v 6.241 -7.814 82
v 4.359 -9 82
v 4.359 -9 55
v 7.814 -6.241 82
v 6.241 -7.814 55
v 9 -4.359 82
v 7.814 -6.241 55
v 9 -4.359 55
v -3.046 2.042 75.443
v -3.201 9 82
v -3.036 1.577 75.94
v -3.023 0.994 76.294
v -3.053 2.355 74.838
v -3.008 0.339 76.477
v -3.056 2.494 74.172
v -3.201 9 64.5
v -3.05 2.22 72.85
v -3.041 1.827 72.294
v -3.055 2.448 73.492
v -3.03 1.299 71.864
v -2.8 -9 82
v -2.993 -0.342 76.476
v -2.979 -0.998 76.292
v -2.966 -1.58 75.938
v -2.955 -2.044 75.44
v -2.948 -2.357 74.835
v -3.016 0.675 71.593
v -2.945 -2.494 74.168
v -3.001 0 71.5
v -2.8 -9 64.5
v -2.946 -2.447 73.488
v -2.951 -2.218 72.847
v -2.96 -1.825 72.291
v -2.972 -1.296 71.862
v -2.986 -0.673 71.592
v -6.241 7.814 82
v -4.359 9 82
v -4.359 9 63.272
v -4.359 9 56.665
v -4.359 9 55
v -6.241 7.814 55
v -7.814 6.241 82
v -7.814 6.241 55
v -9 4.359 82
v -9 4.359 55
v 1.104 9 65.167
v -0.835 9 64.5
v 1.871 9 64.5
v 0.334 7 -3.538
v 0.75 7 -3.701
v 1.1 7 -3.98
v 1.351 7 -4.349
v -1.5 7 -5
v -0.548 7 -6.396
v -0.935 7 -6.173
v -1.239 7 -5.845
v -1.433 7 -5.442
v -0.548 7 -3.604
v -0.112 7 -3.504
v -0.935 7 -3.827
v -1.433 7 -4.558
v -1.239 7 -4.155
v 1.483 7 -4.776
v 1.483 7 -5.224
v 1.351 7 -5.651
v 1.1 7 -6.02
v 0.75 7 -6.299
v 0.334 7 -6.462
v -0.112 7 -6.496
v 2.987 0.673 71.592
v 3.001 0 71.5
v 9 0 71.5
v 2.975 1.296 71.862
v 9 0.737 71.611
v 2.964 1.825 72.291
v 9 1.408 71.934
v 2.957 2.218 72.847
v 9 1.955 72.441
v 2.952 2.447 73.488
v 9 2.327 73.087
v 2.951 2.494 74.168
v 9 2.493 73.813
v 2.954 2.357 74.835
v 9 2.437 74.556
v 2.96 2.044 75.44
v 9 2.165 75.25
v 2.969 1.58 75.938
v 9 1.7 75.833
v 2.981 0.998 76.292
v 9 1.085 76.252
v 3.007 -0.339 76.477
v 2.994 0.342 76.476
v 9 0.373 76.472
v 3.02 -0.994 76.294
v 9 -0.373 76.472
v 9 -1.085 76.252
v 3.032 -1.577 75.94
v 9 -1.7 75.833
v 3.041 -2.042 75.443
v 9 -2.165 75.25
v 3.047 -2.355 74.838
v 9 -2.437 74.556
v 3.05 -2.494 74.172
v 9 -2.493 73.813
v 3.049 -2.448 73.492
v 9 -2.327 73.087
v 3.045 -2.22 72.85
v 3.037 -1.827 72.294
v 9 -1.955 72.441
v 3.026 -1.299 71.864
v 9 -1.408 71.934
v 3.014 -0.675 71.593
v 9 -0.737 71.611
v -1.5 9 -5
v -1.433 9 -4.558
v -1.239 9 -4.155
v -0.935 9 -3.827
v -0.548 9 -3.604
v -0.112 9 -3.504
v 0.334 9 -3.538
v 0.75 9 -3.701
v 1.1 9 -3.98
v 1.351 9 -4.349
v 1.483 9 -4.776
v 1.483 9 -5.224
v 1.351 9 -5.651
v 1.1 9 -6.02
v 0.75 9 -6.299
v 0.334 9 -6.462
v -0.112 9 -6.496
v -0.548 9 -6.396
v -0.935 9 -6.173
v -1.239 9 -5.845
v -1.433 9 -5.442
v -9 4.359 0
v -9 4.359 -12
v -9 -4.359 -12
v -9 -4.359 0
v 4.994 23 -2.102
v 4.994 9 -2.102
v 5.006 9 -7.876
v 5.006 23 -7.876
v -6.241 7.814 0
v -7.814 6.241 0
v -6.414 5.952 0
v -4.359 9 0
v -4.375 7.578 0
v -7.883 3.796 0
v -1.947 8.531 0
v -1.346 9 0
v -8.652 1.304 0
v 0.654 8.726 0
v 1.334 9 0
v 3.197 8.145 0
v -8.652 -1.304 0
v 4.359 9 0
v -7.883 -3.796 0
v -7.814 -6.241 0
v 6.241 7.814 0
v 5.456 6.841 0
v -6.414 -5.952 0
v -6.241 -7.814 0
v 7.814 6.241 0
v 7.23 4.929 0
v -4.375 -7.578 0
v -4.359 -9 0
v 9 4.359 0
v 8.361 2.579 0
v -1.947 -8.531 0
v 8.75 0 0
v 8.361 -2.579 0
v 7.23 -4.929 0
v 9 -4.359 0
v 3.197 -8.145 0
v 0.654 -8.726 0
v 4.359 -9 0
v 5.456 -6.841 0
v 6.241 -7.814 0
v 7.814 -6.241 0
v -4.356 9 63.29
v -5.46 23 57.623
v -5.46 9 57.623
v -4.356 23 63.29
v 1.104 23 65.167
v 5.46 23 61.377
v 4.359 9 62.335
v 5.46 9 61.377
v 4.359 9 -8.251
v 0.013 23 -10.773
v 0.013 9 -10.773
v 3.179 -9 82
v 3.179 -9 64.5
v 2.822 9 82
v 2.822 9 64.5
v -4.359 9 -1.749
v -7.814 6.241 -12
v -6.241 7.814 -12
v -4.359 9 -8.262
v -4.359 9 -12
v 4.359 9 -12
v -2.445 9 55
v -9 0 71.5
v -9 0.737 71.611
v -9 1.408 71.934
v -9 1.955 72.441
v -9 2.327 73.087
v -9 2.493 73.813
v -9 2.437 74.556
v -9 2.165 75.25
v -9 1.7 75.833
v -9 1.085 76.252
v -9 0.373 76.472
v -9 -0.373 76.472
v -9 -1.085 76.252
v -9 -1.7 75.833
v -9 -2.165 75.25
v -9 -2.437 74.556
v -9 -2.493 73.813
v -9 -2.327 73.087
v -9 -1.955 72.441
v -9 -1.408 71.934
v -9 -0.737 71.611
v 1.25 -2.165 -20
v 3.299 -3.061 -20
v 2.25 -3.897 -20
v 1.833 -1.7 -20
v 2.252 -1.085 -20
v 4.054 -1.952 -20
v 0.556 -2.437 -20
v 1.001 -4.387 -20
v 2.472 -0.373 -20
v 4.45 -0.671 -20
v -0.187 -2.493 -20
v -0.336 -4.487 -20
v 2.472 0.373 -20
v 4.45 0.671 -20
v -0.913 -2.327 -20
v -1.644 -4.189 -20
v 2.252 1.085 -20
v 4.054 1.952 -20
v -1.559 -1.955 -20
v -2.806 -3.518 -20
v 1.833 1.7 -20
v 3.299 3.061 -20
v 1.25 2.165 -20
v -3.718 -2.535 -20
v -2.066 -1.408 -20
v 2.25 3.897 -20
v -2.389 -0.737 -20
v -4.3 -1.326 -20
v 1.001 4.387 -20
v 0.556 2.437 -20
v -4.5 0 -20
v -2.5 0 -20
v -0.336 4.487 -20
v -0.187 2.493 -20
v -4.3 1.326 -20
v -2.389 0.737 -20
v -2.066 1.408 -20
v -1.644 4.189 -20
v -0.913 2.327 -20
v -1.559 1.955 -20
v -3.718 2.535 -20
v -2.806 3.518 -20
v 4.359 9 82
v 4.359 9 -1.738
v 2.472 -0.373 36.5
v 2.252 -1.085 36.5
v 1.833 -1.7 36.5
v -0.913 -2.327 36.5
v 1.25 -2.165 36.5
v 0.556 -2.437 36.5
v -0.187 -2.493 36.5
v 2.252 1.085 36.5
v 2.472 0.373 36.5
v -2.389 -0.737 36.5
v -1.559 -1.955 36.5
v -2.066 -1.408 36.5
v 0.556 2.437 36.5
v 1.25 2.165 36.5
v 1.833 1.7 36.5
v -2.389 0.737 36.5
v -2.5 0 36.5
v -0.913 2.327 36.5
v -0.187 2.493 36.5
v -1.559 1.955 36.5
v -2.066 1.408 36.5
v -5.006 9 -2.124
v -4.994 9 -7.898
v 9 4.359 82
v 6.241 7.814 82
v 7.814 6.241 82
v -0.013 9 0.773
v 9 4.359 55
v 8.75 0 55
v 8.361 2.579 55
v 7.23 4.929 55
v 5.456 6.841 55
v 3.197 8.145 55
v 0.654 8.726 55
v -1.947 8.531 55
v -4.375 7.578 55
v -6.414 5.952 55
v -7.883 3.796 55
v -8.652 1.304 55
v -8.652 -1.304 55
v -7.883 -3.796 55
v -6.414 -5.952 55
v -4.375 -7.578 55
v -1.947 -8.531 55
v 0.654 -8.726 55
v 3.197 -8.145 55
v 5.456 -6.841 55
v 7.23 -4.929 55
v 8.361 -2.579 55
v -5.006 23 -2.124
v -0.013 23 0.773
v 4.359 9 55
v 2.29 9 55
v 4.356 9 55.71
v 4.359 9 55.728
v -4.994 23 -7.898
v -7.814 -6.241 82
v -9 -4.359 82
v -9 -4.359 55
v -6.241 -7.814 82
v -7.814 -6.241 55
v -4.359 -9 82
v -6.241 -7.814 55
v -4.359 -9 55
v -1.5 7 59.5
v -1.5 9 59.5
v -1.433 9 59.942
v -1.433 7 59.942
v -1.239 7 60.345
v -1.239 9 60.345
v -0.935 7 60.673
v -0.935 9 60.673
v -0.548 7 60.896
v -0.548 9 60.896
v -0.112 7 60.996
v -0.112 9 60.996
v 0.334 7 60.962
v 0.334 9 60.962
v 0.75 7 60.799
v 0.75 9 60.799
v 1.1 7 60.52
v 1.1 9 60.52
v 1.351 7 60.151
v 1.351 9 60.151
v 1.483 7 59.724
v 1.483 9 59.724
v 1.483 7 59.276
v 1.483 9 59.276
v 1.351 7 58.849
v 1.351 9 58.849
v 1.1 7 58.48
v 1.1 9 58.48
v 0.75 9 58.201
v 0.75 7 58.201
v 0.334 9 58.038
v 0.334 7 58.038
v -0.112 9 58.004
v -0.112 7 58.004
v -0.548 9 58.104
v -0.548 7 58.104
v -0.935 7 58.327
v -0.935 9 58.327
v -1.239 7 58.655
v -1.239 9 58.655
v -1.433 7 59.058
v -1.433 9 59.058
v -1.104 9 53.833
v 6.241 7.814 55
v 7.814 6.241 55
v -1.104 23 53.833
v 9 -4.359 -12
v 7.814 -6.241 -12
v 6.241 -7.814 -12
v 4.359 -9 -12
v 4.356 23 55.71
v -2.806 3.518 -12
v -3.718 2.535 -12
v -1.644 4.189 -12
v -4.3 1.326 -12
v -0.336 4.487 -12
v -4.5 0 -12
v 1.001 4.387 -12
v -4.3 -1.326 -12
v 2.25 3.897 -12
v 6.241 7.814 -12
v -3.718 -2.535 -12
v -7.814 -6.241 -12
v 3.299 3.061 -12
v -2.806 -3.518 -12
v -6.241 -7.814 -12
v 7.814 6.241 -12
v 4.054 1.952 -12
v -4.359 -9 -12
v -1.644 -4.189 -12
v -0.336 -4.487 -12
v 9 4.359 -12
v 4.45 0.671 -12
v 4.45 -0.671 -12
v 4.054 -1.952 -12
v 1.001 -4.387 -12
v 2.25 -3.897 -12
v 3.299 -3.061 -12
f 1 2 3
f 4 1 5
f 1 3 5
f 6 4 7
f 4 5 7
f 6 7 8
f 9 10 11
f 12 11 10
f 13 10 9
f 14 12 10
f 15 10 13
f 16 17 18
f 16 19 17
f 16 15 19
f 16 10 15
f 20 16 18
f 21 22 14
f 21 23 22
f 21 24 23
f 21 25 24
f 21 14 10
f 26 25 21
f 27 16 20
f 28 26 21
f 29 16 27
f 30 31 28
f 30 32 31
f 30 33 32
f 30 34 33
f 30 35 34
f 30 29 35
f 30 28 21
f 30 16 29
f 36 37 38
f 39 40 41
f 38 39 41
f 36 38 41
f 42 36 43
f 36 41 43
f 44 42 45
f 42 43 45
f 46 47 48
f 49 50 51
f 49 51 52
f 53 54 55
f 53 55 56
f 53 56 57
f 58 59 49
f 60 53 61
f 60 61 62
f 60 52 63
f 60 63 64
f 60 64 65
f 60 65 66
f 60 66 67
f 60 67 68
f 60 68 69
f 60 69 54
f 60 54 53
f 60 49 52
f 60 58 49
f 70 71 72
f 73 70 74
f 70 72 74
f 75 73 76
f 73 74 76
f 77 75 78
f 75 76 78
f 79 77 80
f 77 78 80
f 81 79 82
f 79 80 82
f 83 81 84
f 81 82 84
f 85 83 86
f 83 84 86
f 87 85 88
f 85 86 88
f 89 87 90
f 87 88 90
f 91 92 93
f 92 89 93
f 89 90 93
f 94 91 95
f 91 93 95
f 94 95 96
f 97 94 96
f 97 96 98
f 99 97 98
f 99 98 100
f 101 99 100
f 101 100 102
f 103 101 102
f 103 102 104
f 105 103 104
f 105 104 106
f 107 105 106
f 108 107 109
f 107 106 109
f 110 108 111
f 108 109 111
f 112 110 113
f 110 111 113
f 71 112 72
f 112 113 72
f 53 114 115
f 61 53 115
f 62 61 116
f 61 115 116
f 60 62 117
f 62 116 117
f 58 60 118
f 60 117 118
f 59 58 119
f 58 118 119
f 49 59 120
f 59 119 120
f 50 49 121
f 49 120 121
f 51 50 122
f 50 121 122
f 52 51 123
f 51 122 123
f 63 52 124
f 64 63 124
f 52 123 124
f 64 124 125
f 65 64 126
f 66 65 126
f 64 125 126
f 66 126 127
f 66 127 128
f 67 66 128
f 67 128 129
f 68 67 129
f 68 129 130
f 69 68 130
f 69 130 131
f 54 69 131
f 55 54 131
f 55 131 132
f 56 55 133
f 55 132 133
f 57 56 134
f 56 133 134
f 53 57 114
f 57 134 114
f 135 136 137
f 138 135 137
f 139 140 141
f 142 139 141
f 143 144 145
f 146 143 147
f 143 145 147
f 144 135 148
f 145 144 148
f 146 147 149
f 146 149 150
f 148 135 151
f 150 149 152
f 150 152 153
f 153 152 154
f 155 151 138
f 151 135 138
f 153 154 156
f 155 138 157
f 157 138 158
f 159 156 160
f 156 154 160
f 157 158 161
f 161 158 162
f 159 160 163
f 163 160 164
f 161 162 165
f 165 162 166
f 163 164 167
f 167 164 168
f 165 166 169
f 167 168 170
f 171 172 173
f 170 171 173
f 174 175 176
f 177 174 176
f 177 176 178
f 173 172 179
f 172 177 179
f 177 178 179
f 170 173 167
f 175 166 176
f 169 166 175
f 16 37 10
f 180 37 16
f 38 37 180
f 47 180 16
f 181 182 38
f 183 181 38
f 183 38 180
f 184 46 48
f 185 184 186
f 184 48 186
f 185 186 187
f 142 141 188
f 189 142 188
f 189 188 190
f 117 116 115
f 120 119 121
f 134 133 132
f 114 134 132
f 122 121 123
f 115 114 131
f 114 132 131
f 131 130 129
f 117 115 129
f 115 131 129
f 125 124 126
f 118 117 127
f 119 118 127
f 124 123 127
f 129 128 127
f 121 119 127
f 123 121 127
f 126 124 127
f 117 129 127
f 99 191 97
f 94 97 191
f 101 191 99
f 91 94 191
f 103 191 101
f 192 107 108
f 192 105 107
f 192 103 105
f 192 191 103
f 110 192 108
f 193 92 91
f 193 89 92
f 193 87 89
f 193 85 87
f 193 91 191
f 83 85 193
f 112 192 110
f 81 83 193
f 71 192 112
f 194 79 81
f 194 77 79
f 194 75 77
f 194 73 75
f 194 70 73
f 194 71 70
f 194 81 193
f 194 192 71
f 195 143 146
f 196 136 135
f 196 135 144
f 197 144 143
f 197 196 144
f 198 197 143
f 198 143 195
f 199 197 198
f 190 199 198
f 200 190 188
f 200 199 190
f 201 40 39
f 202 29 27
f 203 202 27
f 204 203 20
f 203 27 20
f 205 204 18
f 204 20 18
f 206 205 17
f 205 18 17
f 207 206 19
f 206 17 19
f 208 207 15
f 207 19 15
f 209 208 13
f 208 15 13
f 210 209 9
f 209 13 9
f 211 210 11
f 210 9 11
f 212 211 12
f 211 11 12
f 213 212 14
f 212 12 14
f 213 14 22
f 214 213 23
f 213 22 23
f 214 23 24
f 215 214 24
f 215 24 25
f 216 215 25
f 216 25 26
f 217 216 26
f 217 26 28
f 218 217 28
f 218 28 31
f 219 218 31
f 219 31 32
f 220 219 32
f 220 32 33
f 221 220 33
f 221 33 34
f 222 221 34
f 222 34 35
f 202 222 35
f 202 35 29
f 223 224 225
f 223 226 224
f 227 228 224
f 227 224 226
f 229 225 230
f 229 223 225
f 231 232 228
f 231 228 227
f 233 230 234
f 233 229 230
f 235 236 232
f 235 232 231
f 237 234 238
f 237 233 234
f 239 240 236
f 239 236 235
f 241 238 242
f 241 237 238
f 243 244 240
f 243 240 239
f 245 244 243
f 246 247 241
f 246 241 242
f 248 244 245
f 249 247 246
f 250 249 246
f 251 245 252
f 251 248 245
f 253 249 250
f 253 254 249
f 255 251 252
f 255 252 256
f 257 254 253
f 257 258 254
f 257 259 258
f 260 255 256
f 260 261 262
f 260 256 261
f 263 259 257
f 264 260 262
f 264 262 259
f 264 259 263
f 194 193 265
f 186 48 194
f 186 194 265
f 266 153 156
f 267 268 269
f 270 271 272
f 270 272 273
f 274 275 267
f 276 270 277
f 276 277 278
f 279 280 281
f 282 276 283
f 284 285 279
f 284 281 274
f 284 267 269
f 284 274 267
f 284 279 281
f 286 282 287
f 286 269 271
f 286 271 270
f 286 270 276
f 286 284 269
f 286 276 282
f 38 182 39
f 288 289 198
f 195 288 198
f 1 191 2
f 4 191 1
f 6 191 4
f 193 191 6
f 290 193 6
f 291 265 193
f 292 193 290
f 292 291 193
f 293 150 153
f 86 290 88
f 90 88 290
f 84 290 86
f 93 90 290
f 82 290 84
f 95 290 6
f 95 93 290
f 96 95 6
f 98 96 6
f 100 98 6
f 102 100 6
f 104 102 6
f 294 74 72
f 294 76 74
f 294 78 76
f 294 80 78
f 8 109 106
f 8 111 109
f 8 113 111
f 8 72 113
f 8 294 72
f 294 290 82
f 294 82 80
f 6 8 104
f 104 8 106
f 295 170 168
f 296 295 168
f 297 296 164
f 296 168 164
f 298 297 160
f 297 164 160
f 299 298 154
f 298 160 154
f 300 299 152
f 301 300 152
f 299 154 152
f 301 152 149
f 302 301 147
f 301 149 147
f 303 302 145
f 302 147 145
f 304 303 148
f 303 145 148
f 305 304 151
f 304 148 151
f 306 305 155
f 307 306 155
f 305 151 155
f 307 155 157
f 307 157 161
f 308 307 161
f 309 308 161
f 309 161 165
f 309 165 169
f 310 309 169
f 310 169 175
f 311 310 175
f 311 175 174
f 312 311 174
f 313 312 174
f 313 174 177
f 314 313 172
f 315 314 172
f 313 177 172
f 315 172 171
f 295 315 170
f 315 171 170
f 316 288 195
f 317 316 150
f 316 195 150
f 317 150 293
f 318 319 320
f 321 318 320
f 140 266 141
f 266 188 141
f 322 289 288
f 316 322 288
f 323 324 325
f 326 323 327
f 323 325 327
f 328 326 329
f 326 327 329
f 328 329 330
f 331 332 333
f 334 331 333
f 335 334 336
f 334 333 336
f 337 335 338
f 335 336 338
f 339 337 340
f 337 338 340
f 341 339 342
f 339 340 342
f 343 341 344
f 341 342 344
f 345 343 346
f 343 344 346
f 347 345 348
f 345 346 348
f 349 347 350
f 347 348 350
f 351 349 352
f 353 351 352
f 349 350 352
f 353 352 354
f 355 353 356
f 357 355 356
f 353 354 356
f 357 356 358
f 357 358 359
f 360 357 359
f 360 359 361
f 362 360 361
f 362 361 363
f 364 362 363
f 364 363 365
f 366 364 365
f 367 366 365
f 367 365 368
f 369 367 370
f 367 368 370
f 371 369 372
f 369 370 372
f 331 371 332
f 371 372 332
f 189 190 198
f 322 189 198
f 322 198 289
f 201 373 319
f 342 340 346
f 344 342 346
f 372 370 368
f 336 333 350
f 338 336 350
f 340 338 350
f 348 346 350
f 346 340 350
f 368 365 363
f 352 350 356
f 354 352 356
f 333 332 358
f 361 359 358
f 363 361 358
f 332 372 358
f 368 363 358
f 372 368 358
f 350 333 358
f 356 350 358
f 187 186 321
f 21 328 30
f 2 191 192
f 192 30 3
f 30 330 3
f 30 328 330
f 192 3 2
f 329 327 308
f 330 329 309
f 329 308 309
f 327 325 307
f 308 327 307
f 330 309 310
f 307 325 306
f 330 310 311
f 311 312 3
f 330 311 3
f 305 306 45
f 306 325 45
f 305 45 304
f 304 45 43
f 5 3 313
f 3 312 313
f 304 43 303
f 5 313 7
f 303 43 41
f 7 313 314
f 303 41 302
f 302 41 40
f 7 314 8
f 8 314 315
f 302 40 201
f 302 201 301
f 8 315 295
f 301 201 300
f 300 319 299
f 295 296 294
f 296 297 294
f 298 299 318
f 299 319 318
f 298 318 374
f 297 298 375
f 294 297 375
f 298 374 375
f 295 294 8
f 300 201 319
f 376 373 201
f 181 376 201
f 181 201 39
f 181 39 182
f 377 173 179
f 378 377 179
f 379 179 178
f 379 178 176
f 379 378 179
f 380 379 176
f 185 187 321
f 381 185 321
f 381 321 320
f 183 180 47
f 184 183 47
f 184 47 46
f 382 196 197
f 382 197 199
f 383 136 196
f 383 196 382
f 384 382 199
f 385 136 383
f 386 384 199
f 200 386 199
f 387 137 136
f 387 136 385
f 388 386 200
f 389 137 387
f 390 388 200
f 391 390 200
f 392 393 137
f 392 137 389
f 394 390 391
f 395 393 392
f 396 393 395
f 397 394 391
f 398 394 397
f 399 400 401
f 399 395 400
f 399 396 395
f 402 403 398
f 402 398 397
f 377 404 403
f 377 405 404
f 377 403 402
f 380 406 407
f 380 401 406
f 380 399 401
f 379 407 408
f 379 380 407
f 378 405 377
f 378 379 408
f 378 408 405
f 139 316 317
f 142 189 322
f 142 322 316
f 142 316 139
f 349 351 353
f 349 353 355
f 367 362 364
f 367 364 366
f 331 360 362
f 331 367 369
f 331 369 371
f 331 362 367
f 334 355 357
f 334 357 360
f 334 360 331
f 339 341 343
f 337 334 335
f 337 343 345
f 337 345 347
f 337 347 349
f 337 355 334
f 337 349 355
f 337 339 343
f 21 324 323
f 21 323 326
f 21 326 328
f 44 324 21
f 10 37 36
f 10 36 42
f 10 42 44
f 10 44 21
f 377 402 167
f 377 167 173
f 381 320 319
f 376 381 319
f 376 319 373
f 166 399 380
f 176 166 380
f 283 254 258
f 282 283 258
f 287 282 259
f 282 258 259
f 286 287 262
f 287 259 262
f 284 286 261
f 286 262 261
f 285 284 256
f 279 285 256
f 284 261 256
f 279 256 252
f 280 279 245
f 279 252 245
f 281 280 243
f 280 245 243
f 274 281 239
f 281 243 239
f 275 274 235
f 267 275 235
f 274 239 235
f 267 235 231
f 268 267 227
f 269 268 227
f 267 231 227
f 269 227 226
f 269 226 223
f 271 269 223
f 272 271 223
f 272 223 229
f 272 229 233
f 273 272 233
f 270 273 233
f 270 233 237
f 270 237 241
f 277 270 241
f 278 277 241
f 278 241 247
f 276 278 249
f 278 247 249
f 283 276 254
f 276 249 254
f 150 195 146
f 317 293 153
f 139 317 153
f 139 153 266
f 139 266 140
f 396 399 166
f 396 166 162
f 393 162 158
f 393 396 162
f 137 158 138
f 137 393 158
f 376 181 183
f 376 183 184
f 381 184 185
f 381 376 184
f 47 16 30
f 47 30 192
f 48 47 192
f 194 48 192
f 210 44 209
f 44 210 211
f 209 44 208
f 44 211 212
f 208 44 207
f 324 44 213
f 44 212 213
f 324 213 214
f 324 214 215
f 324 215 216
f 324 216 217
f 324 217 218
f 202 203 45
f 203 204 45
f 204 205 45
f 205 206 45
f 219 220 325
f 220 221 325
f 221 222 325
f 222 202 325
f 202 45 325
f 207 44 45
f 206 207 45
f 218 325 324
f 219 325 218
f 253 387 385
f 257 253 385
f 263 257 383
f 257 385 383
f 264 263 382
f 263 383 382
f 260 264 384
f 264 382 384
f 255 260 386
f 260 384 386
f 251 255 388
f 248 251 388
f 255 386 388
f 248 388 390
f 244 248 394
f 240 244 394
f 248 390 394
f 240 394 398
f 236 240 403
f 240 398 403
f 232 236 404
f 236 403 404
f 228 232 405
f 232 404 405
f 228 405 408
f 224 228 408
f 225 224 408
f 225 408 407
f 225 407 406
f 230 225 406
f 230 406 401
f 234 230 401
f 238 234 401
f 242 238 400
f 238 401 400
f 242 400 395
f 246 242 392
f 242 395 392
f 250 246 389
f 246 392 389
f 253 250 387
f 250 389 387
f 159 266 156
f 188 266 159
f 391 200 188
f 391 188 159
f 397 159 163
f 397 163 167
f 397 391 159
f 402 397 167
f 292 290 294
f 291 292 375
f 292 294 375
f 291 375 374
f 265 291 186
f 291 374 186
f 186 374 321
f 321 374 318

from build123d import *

# Parameters (mm, degrees)
SKETCH1_R           = 8.75
BOSS_EXTRUDE1_DEPTH = 55
SKETCH2_R           = 10
BOSS_EXTRUDE2_DEPTH = 27
BOSS_EXTRUDE3_START = 12
SKETCH3_R           = 10
BOSS_EXTRUDE3_DEPTH = 12
SKETCH4_R           = 4.5
BOSS_EXTRUDE4_DEPTH = 8
CUT_EXTRUDE1_START  = -121.5
CUT_EXTRUDE1_DEPTH  = 121.5
CUT_EXTRUDE2_START  = -17.5
CUT_EXTRUDE2_DEPTH  = 17.5
SKETCH7_R           = 2.5
CUT_EXTRUDE3_DEPTH  = 85.545845551
SKETCH8_R           = 2.5
CUT_EXTRUDE4_DEPTH  = 56.5
CUT_EXTRUDE5_START  = -133.5
CUT_EXTRUDE5_DEPTH  = 133.5
SKETCH10_R          = 1.5
CUT_EXTRUDE6_DEPTH  = 2
SKETCH11_R          = 1.5
CUT_EXTRUDE7_DEPTH  = 2
BOSS_EXTRUDE5_DEPTH = 14
BOSS_EXTRUDE6_DEPTH = 14


with BuildPart() as part:
    # Sketch1 → Boss-Extrude1 (new body)
    with BuildSketch(Plane.XY):
        Circle(SKETCH1_R)
    extrude(amount=BOSS_EXTRUDE1_DEPTH)

    # Sketch2 → Boss-Extrude2 (add)
    with BuildSketch(Plane.XY.offset(55)):
        Circle(SKETCH2_R)
    extrude(amount=BOSS_EXTRUDE2_DEPTH)

    # Sketch3 → Boss-Extrude3 (add)
    with BuildSketch(Plane(origin=(0, 0, 0), x_dir=(-1, 0, 0), z_dir=(0, 0, -1)).offset(BOSS_EXTRUDE3_START)):
        with Locations(Location((0, 0, 0), (0, 0, 180))):
            Circle(SKETCH3_R)
    extrude(amount=-BOSS_EXTRUDE3_DEPTH)

    # Sketch4 → Boss-Extrude4 (add)
    with BuildSketch(Plane(origin=(0, 0, -12), x_dir=(-1, 0, 0), z_dir=(0, 0, -1))):
        Circle(SKETCH4_R)
    extrude(amount=BOSS_EXTRUDE4_DEPTH)

    # Sketch5 → Cut-Extrude1 (cut)
    with BuildSketch(Plane.XY.offset(82).offset(CUT_EXTRUDE1_START)):
        with BuildLine():
            Line((-9, 4.358898944), (-9, -4.358898944))
            ThreePointArc((-9, -4.358898944), (-10, 0), (-9, 4.358898944))
        make_face()
        with BuildLine():
            Line((9, 4.358898944), (9, -4.358898944))
            ThreePointArc((9, -4.358898944), (10, 0), (9, 4.358898944))
        make_face()
    extrude(amount=CUT_EXTRUDE1_DEPTH, mode=Mode.SUBTRACT)

    # Sketch6 → Cut-Extrude2 (cut)
    with BuildSketch(Plane.XY.offset(82).offset(CUT_EXTRUDE2_START)):
        with BuildLine():
            Line((-3.211619504, 9.470242878), (-2.786893563, -9.603813007))
            ThreePointArc((-2.786893563, -9.603813007), (0.210299095, -9.99778847), (3.188273823, -9.478127981))
            Line((3.188273823, -9.478127981), (2.810550168, 9.596916575))
            ThreePointArc((2.810550168, 9.596916575), (-0.210299095, 9.99778847), (-3.211619504, 9.470242878))
        make_face()
    extrude(amount=CUT_EXTRUDE2_DEPTH, mode=Mode.SUBTRACT)

    # Sketch7 → Cut-Extrude3 (cut, through all)
    with BuildSketch(Plane(origin=(9, 0, 0), x_dir=(0, 0, -1), z_dir=(1, 0, 0))):
        with Locations((-74, 0)):
            Circle(SKETCH7_R)
    extrude(amount=-CUT_EXTRUDE3_DEPTH, mode=Mode.SUBTRACT)

    # Sketch8 → Cut-Extrude4 (cut)
    with BuildSketch(Plane(origin=(0, 0, -20), x_dir=(-1, 0, 0), z_dir=(0, 0, -1))):
        Circle(SKETCH8_R)
    extrude(amount=-CUT_EXTRUDE4_DEPTH, mode=Mode.SUBTRACT)

    # Sketch9 → Cut-Extrude5 (cut)
    with BuildSketch(Plane.XY.offset(82).offset(CUT_EXTRUDE5_START)):
        with BuildLine():
            Line((-4.358898944, 9), (4.358898944, 9))
            ThreePointArc((4.358898944, 9), (3.597127672, 9.330630874), (2.810550168, 9.596916575))
            ThreePointArc((2.810550168, 9.596916575), (-0.210299095, 9.99778847), (-3.211619504, 9.470242878))
            ThreePointArc((-3.211619504, 9.470242878), (-3.79255448, 9.252920108), (-4.358898944, 9))
        make_face()
        with BuildLine():
            Line((-4.358898944, -9), (4.358898944, -9))
            ThreePointArc((4.358898944, -9), (3.781151383, -9.257585766), (3.188273823, -9.478127981))
            ThreePointArc((3.188273823, -9.478127981), (0.210299095, -9.99778847), (-2.786893563, -9.603813007))
            ThreePointArc((-2.786893563, -9.603813007), (-3.585628979, -9.335055695), (-4.358898944, -9))
        make_face()
    extrude(amount=CUT_EXTRUDE5_DEPTH, mode=Mode.SUBTRACT)

    # Sketch10 → Cut-Extrude6 (cut)
    with BuildSketch(Plane(origin=(0, 9, 0), x_dir=(1, 0, 0), z_dir=(0, 1, 0))):
        with Locations(Location((0, 5, 0), (0, 0, 180))):
            Circle(SKETCH10_R)
    extrude(amount=-CUT_EXTRUDE6_DEPTH, mode=Mode.SUBTRACT)

    # Sketch11 → Cut-Extrude7 (cut)
    with BuildSketch(Plane(origin=(0, 9, 0), x_dir=(1, 0, 0), z_dir=(0, 1, 0))):
        with Locations(Location((0, -59.5, 0), (0, 0, 180))):
            Circle(SKETCH11_R)
    extrude(amount=-CUT_EXTRUDE7_DEPTH, mode=Mode.SUBTRACT)

    # Sketch13 → Boss-Extrude5 (add)
    with BuildSketch(Plane(origin=(0, 9, 0), x_dir=(1, 0, 0), z_dir=(0, 1, 0))):
        Polygon((4.993693542, 2.102352999), (5.006282685, 7.875841965), (0.012589143, 10.773488967), (-4.993693542, 7.897647001), (-5.006282685, 2.124158035), (-0.012589143, -0.773488967), align=None)
    extrude(amount=BOSS_EXTRUDE5_DEPTH)

    # Sketch14 → Boss-Extrude6 (add)
    with BuildSketch(Plane(origin=(0, 9, 0), x_dir=(1, 0, 0), z_dir=(0, 1, 0))):
        Polygon((1.10432569, -65.166903749), (5.459845453, -61.377077773), (4.355519763, -55.710174024), (-1.10432569, -53.833096251), (-5.459845453, -57.622922227), (-4.355519763, -63.289825976), align=None)
    extrude(amount=BOSS_EXTRUDE6_DEPTH)


solid = part.part
